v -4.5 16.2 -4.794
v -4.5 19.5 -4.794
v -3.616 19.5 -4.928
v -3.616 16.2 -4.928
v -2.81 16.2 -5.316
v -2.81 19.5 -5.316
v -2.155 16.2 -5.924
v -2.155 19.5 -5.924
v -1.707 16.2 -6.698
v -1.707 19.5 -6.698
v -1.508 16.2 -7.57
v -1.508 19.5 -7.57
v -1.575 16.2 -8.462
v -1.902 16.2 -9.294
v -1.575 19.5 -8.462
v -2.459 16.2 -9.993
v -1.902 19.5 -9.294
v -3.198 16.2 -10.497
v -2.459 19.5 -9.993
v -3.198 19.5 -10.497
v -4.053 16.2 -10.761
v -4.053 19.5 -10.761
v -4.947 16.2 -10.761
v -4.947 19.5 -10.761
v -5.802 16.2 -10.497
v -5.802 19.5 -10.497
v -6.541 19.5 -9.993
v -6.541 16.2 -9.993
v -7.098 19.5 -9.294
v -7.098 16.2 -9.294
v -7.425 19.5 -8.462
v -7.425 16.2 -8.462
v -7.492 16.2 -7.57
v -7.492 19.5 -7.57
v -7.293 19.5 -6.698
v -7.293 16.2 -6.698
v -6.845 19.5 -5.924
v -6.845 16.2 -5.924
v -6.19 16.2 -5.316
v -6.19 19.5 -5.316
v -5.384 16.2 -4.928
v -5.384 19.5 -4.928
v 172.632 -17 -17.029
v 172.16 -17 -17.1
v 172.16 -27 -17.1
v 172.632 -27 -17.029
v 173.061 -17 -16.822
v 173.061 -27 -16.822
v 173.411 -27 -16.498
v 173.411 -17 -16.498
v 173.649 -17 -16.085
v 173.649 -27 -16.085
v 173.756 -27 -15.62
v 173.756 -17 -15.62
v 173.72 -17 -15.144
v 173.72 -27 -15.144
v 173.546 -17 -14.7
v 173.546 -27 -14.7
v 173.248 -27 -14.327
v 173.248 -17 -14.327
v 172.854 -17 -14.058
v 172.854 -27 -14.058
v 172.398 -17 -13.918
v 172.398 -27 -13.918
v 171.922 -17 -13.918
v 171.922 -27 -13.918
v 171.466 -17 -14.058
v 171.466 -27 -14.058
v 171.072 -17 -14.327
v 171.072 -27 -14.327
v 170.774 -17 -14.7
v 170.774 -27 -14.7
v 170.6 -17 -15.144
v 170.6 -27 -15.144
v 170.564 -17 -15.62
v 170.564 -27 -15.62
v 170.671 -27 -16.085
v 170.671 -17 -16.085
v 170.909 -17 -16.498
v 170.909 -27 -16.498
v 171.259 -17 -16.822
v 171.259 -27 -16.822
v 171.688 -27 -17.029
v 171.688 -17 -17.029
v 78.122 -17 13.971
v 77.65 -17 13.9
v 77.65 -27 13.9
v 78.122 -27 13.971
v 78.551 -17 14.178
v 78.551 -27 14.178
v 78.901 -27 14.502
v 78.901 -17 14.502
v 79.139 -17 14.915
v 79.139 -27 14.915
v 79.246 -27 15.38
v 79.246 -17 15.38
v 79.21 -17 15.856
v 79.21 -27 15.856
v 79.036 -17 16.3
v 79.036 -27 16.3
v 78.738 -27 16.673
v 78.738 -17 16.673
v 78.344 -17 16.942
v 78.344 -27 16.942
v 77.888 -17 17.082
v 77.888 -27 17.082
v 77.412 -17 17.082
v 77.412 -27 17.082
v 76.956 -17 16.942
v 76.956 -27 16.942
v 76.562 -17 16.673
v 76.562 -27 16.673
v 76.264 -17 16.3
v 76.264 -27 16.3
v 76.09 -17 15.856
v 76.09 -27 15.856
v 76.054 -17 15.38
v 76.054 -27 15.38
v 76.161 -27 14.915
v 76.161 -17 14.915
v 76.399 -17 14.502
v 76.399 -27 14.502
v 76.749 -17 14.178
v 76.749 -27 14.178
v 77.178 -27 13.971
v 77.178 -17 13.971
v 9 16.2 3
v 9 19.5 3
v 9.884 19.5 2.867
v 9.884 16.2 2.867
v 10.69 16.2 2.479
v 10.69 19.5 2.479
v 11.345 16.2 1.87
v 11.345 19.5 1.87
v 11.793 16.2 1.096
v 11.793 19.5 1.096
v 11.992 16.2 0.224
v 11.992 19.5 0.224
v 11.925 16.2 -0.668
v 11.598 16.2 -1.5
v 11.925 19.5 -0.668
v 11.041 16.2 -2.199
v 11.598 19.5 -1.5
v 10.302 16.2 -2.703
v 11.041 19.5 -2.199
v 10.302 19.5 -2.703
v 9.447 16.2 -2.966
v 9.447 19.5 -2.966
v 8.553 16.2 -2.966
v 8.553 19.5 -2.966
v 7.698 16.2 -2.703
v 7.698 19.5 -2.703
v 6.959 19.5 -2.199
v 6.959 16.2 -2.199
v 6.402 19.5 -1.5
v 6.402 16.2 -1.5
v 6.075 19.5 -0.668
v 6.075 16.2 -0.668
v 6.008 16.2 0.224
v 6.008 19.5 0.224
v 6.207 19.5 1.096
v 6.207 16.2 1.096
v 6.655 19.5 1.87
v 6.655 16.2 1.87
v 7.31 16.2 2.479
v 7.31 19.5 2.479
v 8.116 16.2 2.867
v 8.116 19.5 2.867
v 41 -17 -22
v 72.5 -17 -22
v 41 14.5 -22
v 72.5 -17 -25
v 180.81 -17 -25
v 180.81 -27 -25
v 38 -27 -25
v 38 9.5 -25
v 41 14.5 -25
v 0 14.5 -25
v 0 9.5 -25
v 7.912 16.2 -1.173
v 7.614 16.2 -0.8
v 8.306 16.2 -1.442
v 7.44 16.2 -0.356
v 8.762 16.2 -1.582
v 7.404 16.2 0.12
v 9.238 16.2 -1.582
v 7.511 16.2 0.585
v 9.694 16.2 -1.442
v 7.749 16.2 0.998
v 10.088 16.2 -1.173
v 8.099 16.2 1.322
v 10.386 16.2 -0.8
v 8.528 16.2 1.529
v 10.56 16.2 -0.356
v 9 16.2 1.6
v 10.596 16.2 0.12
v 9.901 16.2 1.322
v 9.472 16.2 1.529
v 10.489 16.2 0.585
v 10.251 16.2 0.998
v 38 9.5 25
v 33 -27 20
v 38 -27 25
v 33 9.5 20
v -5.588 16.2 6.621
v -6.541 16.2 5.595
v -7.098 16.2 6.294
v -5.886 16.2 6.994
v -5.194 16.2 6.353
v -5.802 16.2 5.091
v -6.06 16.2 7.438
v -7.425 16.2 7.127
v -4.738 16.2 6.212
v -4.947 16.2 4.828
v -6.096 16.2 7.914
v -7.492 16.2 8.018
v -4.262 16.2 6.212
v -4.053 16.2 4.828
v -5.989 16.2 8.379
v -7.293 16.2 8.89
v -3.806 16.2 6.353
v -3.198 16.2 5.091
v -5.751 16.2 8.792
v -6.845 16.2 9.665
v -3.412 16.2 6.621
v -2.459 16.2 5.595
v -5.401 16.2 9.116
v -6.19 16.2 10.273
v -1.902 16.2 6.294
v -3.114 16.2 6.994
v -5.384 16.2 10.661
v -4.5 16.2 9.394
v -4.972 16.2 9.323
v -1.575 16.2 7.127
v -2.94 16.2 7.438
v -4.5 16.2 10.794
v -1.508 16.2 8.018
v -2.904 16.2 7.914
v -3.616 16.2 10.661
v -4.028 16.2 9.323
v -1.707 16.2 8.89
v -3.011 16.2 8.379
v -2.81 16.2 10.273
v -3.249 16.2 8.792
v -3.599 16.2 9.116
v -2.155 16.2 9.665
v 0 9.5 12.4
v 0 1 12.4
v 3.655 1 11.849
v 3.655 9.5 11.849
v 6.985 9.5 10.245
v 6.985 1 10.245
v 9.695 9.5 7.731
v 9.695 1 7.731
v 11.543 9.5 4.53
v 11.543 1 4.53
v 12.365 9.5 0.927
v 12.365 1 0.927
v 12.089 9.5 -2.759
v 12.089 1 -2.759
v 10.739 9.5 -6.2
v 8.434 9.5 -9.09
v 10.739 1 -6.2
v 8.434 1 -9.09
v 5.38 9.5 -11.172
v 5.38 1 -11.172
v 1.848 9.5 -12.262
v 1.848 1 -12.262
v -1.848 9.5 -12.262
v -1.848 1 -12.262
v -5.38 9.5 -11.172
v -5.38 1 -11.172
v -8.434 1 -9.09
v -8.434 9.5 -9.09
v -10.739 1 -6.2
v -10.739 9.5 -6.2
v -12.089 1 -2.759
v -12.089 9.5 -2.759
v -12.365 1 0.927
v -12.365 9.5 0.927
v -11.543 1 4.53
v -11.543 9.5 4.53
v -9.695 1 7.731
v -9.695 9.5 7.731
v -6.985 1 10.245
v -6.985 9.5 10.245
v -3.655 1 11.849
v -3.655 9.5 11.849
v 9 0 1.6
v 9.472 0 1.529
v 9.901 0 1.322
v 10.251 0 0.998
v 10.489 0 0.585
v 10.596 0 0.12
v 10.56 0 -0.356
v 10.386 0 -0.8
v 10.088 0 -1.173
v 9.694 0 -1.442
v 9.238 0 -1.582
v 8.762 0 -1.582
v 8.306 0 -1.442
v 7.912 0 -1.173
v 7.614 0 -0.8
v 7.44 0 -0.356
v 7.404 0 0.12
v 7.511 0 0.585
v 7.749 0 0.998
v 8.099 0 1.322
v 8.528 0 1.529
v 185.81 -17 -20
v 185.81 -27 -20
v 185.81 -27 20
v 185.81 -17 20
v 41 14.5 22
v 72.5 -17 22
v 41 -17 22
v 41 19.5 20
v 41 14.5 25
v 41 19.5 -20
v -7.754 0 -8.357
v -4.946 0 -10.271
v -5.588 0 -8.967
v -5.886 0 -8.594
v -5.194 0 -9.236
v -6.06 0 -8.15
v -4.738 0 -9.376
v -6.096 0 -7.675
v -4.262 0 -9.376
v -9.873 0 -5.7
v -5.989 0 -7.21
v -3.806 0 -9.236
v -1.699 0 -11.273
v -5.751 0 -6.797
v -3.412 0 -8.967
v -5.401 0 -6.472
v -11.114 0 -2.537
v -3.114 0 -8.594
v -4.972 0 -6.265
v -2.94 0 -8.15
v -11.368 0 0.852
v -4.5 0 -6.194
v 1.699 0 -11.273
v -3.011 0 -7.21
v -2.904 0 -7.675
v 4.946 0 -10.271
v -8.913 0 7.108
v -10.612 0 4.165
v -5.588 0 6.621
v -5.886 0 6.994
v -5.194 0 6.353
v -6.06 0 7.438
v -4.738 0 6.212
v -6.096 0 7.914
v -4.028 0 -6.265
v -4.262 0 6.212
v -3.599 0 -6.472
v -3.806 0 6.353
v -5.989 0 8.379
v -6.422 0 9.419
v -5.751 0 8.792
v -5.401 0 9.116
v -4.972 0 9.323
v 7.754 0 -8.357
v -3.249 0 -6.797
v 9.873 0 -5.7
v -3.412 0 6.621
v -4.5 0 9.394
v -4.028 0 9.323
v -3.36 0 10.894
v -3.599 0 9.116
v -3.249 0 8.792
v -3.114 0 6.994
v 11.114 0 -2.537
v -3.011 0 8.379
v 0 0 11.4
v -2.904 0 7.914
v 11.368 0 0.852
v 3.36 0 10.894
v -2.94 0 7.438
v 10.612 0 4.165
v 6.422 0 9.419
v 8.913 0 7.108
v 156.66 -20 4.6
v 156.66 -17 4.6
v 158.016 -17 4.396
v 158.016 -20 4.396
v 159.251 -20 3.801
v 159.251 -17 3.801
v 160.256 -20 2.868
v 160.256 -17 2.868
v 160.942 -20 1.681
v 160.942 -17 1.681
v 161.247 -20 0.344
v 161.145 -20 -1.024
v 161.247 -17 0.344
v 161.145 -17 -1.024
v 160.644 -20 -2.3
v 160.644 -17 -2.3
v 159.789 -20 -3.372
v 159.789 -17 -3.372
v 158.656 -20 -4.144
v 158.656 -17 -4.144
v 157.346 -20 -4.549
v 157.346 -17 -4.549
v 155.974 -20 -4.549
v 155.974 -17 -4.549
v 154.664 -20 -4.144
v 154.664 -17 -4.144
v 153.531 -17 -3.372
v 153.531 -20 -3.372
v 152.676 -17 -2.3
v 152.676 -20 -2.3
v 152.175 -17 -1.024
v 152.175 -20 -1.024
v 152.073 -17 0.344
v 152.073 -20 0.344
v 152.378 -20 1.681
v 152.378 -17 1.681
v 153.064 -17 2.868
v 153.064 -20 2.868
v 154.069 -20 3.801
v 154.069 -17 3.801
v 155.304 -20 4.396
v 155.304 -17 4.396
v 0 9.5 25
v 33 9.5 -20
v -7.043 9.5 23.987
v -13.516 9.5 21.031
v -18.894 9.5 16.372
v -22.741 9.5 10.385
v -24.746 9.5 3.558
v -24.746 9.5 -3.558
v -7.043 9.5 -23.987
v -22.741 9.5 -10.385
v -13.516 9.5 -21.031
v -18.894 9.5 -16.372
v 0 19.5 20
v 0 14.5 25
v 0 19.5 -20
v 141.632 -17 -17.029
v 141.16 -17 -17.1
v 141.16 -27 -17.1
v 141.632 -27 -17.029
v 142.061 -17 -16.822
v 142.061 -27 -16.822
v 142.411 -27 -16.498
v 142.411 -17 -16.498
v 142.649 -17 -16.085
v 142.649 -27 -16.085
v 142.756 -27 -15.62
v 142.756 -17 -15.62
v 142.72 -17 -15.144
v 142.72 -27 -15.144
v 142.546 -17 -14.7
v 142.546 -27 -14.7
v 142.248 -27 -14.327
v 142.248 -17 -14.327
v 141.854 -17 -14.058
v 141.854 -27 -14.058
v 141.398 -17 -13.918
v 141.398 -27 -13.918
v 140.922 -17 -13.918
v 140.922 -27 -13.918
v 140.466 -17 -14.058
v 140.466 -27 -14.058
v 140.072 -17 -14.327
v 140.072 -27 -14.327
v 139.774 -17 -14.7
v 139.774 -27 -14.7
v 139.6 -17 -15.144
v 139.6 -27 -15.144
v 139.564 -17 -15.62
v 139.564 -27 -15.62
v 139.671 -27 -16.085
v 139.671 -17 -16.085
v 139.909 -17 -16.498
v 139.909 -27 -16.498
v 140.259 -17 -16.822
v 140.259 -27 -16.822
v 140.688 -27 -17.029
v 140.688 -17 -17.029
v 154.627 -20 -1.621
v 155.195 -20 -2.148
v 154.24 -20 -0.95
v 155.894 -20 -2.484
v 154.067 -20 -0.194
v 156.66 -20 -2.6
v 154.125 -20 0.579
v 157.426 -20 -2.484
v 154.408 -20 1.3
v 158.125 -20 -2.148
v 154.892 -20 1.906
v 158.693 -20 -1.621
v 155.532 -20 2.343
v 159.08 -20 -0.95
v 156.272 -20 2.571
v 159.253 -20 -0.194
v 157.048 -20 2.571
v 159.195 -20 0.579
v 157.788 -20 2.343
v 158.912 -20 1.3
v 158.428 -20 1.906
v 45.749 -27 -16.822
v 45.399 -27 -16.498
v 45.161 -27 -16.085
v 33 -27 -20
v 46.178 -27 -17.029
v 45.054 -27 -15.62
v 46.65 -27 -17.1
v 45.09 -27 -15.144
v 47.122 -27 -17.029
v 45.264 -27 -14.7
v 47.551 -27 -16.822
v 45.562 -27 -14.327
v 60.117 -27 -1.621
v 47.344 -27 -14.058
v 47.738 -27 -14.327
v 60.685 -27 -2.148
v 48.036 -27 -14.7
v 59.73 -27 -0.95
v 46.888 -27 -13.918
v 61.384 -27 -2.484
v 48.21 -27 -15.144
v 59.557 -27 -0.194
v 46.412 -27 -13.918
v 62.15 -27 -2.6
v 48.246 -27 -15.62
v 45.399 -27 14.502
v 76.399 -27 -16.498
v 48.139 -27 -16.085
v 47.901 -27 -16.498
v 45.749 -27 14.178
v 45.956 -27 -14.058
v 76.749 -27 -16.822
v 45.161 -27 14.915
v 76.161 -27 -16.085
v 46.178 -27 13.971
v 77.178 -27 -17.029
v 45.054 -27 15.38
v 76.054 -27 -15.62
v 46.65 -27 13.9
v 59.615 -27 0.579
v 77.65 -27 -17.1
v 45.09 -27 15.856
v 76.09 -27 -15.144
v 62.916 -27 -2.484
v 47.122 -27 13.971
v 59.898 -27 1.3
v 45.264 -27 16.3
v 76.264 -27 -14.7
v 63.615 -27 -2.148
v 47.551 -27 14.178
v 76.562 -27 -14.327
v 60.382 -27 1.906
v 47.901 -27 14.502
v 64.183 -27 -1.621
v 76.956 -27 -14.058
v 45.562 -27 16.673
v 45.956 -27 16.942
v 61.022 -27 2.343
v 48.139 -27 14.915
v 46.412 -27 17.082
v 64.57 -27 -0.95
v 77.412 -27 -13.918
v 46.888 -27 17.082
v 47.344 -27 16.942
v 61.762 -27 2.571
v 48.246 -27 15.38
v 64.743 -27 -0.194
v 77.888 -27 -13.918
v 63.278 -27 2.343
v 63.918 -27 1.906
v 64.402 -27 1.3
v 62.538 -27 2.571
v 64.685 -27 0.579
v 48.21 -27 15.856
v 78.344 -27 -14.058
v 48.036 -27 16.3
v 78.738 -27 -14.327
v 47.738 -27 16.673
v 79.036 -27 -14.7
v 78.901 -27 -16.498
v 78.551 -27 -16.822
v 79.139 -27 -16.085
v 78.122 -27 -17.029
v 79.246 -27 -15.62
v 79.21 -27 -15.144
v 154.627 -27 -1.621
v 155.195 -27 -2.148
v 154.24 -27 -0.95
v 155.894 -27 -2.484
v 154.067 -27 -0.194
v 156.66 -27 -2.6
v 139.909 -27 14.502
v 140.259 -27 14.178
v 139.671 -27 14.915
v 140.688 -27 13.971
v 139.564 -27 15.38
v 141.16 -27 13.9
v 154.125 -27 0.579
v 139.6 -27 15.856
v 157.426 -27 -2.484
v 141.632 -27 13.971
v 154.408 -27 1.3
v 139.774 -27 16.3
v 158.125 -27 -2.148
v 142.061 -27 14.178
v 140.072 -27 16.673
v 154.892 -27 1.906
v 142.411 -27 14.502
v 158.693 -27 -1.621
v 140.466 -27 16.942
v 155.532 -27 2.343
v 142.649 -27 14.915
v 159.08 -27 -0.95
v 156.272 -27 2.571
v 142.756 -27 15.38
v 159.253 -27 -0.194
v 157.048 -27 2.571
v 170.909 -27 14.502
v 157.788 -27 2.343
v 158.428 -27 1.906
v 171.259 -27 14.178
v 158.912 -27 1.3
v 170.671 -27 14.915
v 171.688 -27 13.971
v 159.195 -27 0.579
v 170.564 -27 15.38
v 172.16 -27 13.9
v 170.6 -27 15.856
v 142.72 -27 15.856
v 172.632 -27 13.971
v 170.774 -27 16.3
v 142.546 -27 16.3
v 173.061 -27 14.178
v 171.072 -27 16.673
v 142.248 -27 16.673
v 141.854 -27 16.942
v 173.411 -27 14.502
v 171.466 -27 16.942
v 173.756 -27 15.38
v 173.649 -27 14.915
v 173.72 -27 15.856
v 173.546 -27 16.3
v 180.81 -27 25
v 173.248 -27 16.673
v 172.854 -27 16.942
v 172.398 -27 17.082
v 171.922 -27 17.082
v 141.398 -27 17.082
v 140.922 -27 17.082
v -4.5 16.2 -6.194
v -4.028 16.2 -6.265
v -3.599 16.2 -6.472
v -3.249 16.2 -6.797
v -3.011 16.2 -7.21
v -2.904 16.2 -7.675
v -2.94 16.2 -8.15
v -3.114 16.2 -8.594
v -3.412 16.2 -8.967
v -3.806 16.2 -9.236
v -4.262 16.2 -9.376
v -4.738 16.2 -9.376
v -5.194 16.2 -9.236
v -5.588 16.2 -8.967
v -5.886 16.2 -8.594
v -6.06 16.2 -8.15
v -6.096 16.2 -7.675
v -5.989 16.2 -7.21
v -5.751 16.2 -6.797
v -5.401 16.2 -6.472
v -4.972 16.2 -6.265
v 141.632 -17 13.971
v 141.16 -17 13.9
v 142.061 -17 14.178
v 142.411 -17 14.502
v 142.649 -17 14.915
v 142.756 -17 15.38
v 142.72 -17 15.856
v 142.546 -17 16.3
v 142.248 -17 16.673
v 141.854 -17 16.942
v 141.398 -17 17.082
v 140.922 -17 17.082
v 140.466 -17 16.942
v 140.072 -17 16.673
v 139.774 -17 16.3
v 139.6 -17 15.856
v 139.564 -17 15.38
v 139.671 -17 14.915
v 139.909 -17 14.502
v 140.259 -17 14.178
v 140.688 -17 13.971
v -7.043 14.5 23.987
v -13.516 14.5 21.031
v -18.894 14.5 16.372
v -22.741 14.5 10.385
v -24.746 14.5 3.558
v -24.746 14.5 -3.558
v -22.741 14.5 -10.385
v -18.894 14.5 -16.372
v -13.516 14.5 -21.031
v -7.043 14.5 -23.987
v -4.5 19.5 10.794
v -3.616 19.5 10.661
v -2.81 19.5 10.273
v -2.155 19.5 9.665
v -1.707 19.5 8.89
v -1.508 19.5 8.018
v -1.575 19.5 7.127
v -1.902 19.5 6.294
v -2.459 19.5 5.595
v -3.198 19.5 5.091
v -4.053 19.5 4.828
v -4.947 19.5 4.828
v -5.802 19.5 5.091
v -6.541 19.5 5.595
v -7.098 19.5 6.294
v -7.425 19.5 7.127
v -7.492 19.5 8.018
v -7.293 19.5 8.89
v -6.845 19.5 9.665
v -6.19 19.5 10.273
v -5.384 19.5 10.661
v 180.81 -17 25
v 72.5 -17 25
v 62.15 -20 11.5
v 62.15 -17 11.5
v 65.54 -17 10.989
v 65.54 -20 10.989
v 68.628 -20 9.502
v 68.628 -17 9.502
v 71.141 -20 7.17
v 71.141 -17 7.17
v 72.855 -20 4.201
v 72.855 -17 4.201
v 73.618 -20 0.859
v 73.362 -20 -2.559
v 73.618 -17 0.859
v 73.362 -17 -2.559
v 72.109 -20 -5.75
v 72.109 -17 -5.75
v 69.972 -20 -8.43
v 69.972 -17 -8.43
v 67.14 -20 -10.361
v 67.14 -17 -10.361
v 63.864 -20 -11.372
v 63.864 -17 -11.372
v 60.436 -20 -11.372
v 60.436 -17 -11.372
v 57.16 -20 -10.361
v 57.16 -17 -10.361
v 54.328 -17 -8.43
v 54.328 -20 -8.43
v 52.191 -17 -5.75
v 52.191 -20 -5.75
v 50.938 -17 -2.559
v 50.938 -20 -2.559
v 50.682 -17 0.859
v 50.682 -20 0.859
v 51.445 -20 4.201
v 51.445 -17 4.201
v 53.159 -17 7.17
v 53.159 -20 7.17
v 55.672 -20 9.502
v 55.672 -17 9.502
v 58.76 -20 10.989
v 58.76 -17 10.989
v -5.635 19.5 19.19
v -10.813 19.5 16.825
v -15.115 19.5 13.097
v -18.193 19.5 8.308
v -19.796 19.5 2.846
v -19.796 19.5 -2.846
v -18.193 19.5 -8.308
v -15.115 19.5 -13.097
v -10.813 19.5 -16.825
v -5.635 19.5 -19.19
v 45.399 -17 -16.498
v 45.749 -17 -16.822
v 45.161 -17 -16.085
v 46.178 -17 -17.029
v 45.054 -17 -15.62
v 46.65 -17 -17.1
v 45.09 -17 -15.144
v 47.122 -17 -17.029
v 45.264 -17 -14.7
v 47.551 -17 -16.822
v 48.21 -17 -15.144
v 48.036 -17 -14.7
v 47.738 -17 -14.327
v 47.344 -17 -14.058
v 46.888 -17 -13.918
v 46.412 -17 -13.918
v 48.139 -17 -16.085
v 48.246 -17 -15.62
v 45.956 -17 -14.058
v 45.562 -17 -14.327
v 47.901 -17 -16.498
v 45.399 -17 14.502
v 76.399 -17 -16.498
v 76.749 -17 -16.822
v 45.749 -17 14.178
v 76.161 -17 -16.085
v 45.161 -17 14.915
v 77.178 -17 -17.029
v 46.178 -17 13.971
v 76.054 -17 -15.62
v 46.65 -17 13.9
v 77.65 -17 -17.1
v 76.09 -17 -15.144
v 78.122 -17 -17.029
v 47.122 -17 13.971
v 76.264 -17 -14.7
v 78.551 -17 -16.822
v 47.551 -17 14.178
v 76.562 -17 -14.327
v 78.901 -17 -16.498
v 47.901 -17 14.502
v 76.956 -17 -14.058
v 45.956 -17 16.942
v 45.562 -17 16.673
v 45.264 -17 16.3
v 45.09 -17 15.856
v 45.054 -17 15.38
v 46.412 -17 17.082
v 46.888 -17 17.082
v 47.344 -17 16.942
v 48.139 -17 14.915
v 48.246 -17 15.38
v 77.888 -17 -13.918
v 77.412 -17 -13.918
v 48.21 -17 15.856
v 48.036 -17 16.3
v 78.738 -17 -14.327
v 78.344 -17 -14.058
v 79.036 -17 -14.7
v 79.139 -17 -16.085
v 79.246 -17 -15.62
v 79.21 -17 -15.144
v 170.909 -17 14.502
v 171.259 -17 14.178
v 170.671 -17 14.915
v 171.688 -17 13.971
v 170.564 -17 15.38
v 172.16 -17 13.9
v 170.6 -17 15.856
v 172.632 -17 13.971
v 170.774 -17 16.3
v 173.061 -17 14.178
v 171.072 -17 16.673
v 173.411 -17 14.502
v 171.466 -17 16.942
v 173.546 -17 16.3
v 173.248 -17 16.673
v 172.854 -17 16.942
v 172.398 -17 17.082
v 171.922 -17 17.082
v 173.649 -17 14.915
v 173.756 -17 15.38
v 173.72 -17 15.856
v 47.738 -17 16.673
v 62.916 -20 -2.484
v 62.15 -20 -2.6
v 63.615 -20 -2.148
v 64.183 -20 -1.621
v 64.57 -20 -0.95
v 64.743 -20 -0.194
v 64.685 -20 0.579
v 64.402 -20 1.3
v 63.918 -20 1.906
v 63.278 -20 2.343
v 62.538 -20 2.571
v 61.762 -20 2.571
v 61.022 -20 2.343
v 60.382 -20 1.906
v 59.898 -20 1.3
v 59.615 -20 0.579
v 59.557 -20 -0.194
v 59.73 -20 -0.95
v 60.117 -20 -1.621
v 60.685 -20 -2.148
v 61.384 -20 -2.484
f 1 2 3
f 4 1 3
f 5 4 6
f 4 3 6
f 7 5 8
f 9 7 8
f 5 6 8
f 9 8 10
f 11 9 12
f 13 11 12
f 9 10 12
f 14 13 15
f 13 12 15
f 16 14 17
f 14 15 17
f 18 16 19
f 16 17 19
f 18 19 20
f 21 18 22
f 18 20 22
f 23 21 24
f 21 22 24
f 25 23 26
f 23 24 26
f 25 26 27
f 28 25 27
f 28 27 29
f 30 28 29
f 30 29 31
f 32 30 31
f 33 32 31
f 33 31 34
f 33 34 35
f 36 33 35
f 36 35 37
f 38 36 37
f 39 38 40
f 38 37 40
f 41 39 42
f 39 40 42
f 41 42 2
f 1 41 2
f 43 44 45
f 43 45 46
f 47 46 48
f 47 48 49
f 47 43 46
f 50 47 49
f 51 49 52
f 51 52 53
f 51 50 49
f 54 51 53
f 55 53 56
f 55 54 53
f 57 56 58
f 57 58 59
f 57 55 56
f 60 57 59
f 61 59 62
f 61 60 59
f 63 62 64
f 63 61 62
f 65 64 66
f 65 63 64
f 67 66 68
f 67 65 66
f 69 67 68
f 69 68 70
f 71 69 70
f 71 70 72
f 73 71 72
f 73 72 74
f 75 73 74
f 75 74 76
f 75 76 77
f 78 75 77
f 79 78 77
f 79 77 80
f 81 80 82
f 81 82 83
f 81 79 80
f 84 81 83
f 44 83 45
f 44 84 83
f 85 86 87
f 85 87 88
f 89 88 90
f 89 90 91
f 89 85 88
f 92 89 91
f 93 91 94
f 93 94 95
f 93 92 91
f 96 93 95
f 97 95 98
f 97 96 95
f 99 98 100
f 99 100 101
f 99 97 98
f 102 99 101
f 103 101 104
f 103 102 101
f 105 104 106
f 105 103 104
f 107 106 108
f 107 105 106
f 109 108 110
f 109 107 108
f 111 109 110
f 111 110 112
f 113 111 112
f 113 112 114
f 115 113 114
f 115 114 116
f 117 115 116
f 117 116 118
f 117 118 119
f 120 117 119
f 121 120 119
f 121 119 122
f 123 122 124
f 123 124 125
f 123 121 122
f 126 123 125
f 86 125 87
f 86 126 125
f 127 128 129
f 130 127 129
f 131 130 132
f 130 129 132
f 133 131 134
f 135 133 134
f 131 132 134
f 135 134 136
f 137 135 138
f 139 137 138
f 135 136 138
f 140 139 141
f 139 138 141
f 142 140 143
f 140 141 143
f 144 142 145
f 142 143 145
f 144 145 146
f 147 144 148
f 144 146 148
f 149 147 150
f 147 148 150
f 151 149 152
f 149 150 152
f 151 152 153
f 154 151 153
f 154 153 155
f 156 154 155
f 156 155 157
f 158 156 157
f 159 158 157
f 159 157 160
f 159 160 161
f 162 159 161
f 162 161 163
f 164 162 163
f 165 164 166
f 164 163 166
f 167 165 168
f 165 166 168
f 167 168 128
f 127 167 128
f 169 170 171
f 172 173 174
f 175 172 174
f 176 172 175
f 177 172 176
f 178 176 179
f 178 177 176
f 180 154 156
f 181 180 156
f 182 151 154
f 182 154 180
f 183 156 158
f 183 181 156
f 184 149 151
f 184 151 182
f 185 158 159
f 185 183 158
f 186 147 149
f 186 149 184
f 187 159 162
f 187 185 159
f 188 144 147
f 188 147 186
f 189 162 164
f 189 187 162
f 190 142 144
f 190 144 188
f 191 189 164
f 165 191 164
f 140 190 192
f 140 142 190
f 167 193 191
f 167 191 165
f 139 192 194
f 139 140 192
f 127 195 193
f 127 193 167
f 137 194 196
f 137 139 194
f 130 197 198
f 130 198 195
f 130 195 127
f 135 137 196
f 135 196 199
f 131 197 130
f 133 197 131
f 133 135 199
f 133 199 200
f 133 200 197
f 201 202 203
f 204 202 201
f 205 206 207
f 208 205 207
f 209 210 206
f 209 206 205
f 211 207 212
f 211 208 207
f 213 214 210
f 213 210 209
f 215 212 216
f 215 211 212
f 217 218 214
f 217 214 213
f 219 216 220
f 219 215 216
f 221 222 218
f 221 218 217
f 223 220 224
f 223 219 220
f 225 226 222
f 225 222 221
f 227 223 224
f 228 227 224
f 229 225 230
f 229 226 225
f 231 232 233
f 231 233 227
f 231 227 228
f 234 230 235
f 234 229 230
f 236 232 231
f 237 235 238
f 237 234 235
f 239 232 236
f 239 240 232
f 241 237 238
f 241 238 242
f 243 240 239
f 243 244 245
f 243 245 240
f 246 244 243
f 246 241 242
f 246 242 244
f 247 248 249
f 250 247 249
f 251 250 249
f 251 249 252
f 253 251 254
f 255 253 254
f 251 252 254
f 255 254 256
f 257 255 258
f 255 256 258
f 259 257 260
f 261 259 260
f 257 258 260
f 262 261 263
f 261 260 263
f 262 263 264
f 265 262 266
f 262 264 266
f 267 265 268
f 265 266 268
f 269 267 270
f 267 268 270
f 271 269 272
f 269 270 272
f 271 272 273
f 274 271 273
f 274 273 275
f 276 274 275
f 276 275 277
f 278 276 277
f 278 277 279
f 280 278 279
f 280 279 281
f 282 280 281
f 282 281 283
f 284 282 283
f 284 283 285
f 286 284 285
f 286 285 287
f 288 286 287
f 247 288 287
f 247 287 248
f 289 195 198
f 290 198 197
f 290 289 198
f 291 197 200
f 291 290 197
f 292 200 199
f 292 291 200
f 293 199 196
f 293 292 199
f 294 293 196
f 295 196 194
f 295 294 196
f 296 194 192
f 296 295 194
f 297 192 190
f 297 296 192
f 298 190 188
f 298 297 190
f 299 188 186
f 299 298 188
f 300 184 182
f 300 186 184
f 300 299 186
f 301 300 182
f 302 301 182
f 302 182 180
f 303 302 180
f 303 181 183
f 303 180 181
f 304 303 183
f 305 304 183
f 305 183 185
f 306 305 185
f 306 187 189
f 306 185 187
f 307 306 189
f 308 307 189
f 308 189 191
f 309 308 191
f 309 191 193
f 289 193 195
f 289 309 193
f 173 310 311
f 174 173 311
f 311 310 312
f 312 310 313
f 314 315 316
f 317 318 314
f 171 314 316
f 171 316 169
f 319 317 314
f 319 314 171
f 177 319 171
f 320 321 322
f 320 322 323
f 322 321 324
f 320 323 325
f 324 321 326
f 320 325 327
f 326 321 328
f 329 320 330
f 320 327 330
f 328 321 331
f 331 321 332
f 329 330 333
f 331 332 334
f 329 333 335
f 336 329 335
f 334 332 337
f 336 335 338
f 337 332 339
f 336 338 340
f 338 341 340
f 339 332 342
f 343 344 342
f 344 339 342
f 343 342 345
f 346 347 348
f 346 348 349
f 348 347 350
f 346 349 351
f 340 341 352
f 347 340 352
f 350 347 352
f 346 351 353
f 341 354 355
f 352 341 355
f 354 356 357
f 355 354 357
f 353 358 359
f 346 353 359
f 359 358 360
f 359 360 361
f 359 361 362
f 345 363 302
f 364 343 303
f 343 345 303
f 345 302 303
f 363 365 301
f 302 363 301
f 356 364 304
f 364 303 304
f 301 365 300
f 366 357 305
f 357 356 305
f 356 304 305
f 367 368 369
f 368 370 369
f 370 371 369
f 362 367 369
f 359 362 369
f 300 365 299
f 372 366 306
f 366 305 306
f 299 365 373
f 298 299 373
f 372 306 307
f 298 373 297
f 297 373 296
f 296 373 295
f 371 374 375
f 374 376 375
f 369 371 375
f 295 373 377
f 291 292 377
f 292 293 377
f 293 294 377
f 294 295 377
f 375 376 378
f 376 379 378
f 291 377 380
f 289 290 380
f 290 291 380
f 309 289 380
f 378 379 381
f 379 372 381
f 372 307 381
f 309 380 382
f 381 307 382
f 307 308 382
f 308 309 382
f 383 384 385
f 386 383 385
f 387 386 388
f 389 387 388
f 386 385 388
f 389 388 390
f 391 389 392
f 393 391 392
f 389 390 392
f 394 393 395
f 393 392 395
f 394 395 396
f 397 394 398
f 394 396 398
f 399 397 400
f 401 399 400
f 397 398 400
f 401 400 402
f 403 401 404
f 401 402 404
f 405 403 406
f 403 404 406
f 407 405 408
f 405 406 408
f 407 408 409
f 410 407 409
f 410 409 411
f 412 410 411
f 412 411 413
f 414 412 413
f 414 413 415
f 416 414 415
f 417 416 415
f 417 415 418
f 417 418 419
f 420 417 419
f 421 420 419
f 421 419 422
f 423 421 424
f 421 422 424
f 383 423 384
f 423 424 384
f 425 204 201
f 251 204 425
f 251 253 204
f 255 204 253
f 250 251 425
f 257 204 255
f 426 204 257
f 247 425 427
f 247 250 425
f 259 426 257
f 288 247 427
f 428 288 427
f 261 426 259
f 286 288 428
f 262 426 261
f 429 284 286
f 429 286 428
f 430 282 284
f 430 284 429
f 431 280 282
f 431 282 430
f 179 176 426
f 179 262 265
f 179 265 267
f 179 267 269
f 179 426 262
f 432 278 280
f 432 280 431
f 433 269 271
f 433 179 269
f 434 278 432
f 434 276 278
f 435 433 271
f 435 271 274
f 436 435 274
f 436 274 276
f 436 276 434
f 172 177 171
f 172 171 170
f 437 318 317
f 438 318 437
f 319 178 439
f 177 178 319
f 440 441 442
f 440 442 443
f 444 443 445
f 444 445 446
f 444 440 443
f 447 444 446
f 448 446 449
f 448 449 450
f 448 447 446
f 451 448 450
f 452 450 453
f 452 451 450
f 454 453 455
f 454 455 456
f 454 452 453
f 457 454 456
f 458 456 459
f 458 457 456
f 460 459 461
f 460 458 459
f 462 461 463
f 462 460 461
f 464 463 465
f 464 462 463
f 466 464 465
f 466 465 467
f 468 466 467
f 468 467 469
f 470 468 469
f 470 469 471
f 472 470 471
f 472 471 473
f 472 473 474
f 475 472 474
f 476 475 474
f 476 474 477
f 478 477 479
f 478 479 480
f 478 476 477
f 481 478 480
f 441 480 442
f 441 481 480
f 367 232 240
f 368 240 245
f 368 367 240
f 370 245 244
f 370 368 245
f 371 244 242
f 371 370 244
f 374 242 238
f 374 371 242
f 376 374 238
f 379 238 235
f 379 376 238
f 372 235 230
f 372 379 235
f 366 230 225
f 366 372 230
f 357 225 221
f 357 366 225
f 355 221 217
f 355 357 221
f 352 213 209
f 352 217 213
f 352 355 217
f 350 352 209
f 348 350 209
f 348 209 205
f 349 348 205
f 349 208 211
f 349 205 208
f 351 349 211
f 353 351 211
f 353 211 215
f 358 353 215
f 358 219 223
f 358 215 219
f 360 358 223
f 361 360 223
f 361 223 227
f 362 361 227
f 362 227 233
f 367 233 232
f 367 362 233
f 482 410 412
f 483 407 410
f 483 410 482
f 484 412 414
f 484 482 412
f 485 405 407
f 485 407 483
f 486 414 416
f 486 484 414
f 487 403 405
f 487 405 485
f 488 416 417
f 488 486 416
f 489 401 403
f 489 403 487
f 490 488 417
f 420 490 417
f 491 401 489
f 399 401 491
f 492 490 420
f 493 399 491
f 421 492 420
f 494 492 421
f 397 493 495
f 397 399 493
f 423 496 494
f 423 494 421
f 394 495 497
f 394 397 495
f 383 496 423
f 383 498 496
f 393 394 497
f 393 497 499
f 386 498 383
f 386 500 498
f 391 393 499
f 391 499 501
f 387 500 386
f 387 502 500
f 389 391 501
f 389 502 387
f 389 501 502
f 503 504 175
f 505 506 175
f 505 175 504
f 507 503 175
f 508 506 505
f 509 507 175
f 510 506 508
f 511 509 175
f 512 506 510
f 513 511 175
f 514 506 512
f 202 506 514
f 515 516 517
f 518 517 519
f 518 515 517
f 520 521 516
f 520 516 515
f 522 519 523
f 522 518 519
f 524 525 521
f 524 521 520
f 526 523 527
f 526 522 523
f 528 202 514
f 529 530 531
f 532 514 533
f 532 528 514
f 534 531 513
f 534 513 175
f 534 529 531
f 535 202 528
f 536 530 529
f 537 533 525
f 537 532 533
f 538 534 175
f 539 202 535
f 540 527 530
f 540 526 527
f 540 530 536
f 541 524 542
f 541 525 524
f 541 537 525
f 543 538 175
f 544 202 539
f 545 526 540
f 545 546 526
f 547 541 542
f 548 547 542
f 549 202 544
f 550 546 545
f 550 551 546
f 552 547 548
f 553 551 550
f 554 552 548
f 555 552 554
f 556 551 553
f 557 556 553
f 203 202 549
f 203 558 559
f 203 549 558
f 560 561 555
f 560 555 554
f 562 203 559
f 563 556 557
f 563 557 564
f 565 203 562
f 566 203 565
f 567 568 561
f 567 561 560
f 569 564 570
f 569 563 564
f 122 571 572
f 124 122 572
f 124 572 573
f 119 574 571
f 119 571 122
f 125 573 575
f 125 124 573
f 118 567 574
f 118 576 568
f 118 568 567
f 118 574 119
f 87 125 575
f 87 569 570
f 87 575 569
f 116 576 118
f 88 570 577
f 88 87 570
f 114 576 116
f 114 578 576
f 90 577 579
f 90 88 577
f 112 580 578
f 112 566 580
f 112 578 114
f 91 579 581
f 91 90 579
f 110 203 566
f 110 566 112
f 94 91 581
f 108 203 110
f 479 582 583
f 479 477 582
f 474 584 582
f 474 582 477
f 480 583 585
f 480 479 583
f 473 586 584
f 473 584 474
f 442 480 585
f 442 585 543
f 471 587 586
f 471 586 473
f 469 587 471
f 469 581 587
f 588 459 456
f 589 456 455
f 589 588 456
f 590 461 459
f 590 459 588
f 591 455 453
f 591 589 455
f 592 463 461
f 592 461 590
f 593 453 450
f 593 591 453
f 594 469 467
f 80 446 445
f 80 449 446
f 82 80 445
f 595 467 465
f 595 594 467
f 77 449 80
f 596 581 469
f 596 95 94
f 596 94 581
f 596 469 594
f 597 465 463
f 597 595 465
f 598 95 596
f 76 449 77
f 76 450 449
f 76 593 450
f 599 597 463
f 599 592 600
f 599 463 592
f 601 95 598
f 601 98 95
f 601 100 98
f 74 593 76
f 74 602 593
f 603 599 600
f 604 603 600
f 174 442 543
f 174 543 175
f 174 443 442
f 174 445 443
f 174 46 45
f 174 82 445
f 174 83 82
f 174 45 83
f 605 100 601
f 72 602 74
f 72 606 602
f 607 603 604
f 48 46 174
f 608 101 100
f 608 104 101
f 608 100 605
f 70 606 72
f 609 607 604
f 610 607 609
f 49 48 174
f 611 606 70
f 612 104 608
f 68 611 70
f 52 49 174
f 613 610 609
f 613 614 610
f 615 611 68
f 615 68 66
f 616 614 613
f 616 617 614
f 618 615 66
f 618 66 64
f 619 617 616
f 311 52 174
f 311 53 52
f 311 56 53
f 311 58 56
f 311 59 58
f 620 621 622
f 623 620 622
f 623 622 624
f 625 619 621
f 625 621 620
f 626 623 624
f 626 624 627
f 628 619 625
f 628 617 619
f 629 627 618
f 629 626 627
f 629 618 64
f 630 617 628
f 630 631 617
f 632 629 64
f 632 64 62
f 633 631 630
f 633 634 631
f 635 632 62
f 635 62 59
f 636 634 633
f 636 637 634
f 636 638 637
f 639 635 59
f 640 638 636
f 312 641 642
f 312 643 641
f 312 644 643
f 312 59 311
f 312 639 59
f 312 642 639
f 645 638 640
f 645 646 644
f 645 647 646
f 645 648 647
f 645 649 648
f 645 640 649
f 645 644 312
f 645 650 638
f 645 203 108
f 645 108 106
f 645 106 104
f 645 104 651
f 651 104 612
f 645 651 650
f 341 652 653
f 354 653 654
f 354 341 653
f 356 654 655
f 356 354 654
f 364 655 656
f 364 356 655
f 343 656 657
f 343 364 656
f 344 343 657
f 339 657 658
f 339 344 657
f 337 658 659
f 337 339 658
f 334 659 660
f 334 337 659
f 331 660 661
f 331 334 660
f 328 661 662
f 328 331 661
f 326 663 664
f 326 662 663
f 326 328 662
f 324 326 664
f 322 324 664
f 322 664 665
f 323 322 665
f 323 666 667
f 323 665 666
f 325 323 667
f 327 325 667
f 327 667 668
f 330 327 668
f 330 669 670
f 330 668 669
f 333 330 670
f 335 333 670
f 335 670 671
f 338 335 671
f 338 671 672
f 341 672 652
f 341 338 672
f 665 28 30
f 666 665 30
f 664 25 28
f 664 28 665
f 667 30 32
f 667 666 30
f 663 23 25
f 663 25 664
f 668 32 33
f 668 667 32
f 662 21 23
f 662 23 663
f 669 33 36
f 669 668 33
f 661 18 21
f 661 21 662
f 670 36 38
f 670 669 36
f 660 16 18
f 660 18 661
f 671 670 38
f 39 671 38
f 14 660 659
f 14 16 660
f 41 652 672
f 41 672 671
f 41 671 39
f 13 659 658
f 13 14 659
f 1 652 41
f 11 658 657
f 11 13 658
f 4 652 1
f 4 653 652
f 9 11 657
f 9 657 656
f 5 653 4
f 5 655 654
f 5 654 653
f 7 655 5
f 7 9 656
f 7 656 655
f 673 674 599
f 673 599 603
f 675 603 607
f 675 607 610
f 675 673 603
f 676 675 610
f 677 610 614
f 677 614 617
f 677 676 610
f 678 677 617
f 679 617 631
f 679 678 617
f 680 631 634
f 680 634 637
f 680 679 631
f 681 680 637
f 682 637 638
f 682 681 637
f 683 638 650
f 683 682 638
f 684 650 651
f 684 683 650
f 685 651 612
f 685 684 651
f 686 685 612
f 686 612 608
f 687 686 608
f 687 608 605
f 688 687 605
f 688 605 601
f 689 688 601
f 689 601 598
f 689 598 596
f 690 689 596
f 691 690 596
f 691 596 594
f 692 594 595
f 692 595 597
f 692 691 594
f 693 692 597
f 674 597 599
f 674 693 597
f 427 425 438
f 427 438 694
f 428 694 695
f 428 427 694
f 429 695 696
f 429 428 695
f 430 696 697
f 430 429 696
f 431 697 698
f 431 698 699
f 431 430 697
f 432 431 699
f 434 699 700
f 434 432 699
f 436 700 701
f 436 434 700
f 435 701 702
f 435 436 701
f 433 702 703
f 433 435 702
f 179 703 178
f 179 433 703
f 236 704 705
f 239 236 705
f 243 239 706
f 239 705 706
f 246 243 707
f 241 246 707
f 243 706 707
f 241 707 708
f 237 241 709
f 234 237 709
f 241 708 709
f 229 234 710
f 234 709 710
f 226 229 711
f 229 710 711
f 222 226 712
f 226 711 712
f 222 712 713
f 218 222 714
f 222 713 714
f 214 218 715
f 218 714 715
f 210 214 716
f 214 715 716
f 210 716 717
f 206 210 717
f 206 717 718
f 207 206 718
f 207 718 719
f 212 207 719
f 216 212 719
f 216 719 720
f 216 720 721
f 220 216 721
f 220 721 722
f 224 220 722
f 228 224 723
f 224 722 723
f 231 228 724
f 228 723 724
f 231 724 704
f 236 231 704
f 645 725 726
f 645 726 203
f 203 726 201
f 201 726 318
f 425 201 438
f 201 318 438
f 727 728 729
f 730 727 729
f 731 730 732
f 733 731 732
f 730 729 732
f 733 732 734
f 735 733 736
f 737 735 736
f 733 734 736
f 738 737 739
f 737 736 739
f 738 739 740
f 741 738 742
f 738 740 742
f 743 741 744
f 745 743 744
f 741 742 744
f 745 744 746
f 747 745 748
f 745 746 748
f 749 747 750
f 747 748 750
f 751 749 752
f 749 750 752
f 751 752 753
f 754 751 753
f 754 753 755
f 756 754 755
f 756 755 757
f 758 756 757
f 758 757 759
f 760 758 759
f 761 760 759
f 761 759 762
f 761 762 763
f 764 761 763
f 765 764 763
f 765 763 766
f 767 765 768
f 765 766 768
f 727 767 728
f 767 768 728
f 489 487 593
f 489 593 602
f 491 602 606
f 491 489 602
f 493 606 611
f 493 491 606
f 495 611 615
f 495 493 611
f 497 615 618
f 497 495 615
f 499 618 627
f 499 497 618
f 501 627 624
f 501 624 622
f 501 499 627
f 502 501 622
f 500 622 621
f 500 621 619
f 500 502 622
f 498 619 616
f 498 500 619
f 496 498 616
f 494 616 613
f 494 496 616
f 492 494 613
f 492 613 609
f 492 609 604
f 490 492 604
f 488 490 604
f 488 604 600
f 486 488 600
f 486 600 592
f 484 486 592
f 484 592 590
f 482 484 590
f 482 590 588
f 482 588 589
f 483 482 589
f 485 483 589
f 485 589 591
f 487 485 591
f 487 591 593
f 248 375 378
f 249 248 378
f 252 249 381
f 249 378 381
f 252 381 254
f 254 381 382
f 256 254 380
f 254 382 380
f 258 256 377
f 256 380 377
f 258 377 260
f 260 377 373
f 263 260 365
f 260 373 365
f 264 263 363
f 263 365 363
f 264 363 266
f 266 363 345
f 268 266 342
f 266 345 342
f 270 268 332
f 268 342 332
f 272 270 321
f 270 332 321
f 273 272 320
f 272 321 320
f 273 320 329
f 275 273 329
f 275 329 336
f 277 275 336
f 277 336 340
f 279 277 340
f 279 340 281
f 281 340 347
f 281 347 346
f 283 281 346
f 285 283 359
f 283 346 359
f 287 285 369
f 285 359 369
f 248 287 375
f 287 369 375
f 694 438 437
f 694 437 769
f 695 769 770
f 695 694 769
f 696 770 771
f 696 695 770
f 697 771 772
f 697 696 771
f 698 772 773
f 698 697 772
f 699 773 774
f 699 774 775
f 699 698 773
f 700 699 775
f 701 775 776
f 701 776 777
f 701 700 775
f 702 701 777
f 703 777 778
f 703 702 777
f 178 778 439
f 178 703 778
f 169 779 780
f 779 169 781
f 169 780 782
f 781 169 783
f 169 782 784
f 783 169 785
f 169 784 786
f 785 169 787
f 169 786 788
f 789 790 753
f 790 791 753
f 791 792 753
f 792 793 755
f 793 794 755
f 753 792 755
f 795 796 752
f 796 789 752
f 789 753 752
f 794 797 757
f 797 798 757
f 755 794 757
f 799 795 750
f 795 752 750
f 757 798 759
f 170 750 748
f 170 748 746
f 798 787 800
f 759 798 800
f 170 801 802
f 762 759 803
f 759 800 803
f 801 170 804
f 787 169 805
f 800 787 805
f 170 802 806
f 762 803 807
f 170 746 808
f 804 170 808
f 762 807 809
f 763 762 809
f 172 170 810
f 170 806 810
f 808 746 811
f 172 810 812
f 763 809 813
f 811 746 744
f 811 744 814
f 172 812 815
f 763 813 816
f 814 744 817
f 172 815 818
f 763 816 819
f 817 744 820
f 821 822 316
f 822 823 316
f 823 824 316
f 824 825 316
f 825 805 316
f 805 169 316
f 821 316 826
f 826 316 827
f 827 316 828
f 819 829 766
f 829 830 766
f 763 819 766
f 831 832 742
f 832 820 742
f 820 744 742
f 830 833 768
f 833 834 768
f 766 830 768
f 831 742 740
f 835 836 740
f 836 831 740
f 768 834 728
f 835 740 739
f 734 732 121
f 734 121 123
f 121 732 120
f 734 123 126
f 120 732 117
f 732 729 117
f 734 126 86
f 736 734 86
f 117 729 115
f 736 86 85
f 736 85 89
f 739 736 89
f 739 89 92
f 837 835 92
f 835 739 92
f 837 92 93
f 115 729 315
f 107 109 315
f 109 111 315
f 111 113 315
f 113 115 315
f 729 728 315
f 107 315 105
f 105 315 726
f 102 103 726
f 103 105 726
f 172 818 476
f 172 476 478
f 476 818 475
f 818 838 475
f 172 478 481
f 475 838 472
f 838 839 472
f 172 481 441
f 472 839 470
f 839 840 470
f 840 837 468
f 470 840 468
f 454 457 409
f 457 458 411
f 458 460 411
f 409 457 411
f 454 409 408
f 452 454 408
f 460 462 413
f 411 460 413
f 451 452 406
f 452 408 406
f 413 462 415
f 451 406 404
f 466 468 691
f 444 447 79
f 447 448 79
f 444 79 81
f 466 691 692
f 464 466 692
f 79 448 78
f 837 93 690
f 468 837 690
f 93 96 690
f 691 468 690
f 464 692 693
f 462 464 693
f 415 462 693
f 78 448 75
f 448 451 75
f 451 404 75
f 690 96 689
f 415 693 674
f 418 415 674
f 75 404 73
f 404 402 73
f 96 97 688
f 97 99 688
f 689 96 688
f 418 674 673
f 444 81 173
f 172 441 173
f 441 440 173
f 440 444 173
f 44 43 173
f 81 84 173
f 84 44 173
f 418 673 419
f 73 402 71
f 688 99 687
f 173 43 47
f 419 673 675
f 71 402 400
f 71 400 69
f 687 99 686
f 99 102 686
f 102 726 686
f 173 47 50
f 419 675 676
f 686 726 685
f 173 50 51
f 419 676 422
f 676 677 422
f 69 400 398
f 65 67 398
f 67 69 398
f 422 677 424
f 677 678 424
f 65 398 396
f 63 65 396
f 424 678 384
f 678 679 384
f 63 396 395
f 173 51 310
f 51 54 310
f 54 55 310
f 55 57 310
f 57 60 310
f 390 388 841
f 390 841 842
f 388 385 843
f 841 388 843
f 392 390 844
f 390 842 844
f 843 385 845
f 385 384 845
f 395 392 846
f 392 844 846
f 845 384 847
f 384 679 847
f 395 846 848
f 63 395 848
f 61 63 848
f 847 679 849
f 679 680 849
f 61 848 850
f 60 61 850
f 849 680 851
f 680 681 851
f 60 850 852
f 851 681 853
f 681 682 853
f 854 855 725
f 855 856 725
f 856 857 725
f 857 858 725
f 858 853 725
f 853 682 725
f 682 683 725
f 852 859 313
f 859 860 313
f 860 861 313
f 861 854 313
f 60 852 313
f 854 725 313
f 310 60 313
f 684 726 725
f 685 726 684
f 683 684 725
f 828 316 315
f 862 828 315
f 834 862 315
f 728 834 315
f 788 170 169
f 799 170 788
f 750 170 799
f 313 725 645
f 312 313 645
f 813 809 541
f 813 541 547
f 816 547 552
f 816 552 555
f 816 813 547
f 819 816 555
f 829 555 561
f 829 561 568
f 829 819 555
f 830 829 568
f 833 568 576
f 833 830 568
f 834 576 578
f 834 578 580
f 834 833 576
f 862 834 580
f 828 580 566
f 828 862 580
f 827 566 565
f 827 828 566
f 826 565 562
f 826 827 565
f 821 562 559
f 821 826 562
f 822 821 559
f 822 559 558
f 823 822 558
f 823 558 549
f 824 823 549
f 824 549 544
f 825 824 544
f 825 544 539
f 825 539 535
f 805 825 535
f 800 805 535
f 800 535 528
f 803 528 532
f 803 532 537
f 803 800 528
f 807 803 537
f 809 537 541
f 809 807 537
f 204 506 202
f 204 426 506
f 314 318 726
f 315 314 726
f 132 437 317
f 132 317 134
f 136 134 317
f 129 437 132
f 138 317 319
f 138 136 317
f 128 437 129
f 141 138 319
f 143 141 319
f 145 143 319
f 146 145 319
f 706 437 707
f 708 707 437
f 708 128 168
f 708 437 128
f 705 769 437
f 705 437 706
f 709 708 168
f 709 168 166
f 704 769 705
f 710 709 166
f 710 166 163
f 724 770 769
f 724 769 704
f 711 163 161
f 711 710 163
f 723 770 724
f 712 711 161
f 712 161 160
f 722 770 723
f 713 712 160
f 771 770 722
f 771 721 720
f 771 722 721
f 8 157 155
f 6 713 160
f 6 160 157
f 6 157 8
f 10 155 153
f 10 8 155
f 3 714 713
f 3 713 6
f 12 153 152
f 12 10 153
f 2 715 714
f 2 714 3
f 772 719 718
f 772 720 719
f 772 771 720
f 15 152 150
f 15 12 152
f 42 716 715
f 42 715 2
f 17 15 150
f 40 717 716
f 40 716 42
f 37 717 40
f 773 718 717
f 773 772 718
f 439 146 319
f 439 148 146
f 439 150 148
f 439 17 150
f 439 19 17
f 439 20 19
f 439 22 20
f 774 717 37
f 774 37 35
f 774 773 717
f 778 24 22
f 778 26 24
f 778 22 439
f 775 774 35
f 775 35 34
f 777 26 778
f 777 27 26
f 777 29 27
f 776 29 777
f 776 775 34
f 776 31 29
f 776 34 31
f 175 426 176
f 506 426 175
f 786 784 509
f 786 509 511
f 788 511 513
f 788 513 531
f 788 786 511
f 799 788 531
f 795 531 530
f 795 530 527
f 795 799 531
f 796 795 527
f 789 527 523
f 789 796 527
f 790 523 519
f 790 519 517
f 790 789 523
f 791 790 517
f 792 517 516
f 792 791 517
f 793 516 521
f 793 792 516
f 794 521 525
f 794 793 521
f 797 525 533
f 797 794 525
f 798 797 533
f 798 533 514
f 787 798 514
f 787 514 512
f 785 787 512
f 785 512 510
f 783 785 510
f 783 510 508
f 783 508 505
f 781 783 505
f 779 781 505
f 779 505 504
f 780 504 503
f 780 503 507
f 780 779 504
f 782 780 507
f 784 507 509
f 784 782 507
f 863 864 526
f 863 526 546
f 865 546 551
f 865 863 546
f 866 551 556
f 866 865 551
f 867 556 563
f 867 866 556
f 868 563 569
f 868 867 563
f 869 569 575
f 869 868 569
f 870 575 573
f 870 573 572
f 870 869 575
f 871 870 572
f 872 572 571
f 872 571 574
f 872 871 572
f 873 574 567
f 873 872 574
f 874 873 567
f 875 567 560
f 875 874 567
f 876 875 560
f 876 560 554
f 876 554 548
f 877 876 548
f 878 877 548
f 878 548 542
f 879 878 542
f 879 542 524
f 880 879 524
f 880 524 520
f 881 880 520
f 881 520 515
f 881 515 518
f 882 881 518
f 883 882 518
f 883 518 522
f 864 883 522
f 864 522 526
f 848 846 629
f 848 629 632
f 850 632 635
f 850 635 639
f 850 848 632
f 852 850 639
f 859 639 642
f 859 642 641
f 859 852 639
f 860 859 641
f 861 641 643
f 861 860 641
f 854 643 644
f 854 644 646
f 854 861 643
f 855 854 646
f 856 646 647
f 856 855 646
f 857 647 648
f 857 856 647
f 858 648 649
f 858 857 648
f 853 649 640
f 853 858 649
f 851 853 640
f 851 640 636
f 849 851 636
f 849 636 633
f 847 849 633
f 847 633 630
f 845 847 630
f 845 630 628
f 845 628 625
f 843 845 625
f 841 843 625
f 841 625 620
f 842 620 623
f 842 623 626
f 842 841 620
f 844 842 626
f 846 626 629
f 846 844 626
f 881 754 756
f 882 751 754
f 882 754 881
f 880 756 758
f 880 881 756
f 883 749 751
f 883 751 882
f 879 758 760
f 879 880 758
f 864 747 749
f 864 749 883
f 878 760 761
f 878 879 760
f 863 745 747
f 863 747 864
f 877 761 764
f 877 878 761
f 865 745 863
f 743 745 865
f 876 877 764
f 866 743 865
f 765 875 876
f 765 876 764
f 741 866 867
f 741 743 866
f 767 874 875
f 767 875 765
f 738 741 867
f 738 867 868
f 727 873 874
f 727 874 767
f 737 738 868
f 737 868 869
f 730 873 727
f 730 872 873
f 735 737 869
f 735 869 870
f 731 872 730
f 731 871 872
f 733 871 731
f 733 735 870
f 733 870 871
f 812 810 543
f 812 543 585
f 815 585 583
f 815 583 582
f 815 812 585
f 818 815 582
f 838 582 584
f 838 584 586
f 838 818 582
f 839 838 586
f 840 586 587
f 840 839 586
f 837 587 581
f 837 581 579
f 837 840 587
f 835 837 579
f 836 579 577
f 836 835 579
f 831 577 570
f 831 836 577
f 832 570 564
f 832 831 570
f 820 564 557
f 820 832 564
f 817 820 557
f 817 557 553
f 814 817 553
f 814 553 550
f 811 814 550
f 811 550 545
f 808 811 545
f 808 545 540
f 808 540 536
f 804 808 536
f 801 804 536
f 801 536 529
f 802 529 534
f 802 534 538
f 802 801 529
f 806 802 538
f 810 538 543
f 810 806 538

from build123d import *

# Parameters (mm, degrees)
SKETCH_1_R          = 12.4
SKETCH_1_R_2        = 1.6
EXTRUDE_1_DEPTH     = 19.5
EXTRUDE_START       = -10
SKETCH_4_R          = 12.4
EXTRUDE_3_DEPTH     = 10
SKETCH_5_W          = 50
SKETCH_5_H          = 36.5
EXTRUDE_4_DEPTH     = 8
SKETCH_6_W          = 152.81
SKETCH_6_H          = 50
SKETCH_6_R          = 2.6
SKETCH_6_R_2        = 1.6
EXTRUDE_5_DEPTH     = 10
SKETCH_7_R          = 4.6
CUT_EXTRUDE_1_DEPTH = 3
CHAMFER_2_SIZE      = 5
EXTRUDE_6_DEPTH     = 3
EXTRUDE_7_DEPTH     = 3
CHAMFER_3_SIZE      = 5
CHAMFER_4_SIZE      = 5
SKETCH_13_R         = 11.5
CUT_EXTRUDE_3_DEPTH = 3
CHAMFER_6_SIZE      = 1
SKETCH_18_R         = 3
CUT_EXTRUDE_6_DEPTH = 3.3


with BuildPart() as part:
    # 草图1 → 凸台-拉伸1 (new body)
    with BuildSketch(Plane(origin=(0, 0, 0), x_dir=(1, 0, 0), z_dir=(0, 1, 0))):
        Circle(SKETCH_1_R)
        with Locations((9, 0)):
            Circle(SKETCH_1_R_2, mode=Mode.SUBTRACT)
        with Locations((-4.5, -7.794228634)):
            Circle(SKETCH_1_R_2, mode=Mode.SUBTRACT)
        with Locations((-4.5, 7.794228634)):
            Circle(SKETCH_1_R_2, mode=Mode.SUBTRACT)
    extrude(amount=EXTRUDE_1_DEPTH)

    # 草图4 → 凸台-拉伸3 (add)
    with BuildSketch(Plane(origin=(0, 19.5, 0), x_dir=(1, 0, 0), z_dir=(0, 1, 0)).offset(EXTRUDE_START)):
        with BuildLine():
            Line((0, 25), (33, 25))
            Line((33, 25), (33, -25))
            Line((33, -25), (0, -25))
            ThreePointArc((0, -25), (-25, 0), (0, 25))
        make_face()
        Circle(SKETCH_4_R, mode=Mode.SUBTRACT)
    extrude(amount=EXTRUDE_3_DEPTH)

    # 草图5 → 凸台-拉伸4 (add)
    with BuildSketch(Plane(origin=(33, 0, 0), x_dir=(0, 0, -1), z_dir=(1, 0, 0))):
        with Locations((0, 1.25)):
            Rectangle(SKETCH_5_W, SKETCH_5_H)
    extrude(amount=EXTRUDE_4_DEPTH)

    # 草图6 → 凸台-拉伸5 (add)
    with BuildSketch(Plane.XZ.offset(17)):
        with Locations((109.405, 0)):
            Rectangle(SKETCH_6_W, SKETCH_6_H)
        with Locations((62.15, 0)):
            Circle(SKETCH_6_R, mode=Mode.SUBTRACT)
        with Locations((156.66, 0)):
            Circle(SKETCH_6_R, mode=Mode.SUBTRACT)
        with Locations((46.65, 15.5)):
            Circle(SKETCH_6_R_2, mode=Mode.SUBTRACT)
        with Locations((77.65, 15.5)):
            Circle(SKETCH_6_R_2, mode=Mode.SUBTRACT)
        with Locations((77.65, -15.5)):
            Circle(SKETCH_6_R_2, mode=Mode.SUBTRACT)
        with Locations((46.65, -15.5)):
            Circle(SKETCH_6_R_2, mode=Mode.SUBTRACT)
        with Locations((141.16, 15.5)):
            Circle(SKETCH_6_R_2, mode=Mode.SUBTRACT)
        with Locations((172.16, 15.5)):
            Circle(SKETCH_6_R_2, mode=Mode.SUBTRACT)
        with Locations((172.16, -15.5)):
            Circle(SKETCH_6_R_2, mode=Mode.SUBTRACT)
        with Locations((141.16, -15.5)):
            Circle(SKETCH_6_R_2, mode=Mode.SUBTRACT)
    extrude(amount=EXTRUDE_5_DEPTH)

    # 草图7 → 切除-拉伸1 (cut)
    with BuildSketch(Plane(origin=(0, -17, 0), x_dir=(1, 0, 0), z_dir=(0, 1, 0))):
        with Locations((156.66, 0)):
            Circle(SKETCH_7_R)
    extrude(amount=-CUT_EXTRUDE_1_DEPTH, mode=Mode.SUBTRACT)

    # 倒角2
    chamfer_2_edges = [part.edges().sort_by_distance(p)[0] for p in [
        (20.5, 19.5, -25),
        (20.5, 19.5, 25),
        (-25, 19.5, 0),
    ]]
    chamfer(chamfer_2_edges, length=CHAMFER_2_SIZE)

    # 草图9 → 凸台-拉伸6 (add)
    with BuildSketch(Plane.XY.offset(25)):
        Polygon((41, 14.5), (72.5, -17), (41, -17), align=None)
    extrude(amount=-EXTRUDE_6_DEPTH)

    # 草图10 → 凸台-拉伸7 (add)
    with BuildSketch(Plane(origin=(0, 0, -25), x_dir=(-1, 0, 0), z_dir=(0, 0, -1))):
        Polygon((-41, -17), (-41, 14.5), (-72.5, -17), align=None)
    extrude(amount=-EXTRUDE_7_DEPTH)

    # 倒角3
    chamfer_3_edges = [part.edges().sort_by_distance(p)[0] for p in [
        (33, -8.75, 25),
        (33, -8.75, -25),
    ]]
    chamfer(chamfer_3_edges, length=CHAMFER_3_SIZE)

    # 倒角4
    chamfer_4_edges = [part.edges().sort_by_distance(p)[0] for p in [
        (185.81, -22, 25),
        (185.81, -22, -25),
    ]]
    chamfer(chamfer_4_edges, length=CHAMFER_4_SIZE)

    # 草图13 → 切除-拉伸3 (cut)
    with BuildSketch(Plane(origin=(0, -17, 0), x_dir=(1, 0, 0), z_dir=(0, 1, 0))):
        with Locations((62.15, 0)):
            Circle(SKETCH_13_R)
    extrude(amount=-CUT_EXTRUDE_3_DEPTH, mode=Mode.SUBTRACT)

    # 倒角6
    chamfer_6_edges = [part.edges().sort_by_distance(p)[0] for p in [
        (-12.4, 0, 0),
    ]]
    chamfer(chamfer_6_edges, length=CHAMFER_6_SIZE)

    # 草图18 → 切除-拉伸6 (cut)
    with BuildSketch(Plane(origin=(0, 19.5, 0), x_dir=(1, 0, 0), z_dir=(0, 1, 0))):
        with Locations((-4.5, 7.794228634)):
            Circle(SKETCH_18_R)
        with Locations((-4.5, -7.794228634)):
            Circle(SKETCH_18_R)
        with Locations((9, 0)):
            Circle(SKETCH_18_R)
    extrude(amount=-CUT_EXTRUDE_6_DEPTH, mode=Mode.SUBTRACT)


solid = part.part
